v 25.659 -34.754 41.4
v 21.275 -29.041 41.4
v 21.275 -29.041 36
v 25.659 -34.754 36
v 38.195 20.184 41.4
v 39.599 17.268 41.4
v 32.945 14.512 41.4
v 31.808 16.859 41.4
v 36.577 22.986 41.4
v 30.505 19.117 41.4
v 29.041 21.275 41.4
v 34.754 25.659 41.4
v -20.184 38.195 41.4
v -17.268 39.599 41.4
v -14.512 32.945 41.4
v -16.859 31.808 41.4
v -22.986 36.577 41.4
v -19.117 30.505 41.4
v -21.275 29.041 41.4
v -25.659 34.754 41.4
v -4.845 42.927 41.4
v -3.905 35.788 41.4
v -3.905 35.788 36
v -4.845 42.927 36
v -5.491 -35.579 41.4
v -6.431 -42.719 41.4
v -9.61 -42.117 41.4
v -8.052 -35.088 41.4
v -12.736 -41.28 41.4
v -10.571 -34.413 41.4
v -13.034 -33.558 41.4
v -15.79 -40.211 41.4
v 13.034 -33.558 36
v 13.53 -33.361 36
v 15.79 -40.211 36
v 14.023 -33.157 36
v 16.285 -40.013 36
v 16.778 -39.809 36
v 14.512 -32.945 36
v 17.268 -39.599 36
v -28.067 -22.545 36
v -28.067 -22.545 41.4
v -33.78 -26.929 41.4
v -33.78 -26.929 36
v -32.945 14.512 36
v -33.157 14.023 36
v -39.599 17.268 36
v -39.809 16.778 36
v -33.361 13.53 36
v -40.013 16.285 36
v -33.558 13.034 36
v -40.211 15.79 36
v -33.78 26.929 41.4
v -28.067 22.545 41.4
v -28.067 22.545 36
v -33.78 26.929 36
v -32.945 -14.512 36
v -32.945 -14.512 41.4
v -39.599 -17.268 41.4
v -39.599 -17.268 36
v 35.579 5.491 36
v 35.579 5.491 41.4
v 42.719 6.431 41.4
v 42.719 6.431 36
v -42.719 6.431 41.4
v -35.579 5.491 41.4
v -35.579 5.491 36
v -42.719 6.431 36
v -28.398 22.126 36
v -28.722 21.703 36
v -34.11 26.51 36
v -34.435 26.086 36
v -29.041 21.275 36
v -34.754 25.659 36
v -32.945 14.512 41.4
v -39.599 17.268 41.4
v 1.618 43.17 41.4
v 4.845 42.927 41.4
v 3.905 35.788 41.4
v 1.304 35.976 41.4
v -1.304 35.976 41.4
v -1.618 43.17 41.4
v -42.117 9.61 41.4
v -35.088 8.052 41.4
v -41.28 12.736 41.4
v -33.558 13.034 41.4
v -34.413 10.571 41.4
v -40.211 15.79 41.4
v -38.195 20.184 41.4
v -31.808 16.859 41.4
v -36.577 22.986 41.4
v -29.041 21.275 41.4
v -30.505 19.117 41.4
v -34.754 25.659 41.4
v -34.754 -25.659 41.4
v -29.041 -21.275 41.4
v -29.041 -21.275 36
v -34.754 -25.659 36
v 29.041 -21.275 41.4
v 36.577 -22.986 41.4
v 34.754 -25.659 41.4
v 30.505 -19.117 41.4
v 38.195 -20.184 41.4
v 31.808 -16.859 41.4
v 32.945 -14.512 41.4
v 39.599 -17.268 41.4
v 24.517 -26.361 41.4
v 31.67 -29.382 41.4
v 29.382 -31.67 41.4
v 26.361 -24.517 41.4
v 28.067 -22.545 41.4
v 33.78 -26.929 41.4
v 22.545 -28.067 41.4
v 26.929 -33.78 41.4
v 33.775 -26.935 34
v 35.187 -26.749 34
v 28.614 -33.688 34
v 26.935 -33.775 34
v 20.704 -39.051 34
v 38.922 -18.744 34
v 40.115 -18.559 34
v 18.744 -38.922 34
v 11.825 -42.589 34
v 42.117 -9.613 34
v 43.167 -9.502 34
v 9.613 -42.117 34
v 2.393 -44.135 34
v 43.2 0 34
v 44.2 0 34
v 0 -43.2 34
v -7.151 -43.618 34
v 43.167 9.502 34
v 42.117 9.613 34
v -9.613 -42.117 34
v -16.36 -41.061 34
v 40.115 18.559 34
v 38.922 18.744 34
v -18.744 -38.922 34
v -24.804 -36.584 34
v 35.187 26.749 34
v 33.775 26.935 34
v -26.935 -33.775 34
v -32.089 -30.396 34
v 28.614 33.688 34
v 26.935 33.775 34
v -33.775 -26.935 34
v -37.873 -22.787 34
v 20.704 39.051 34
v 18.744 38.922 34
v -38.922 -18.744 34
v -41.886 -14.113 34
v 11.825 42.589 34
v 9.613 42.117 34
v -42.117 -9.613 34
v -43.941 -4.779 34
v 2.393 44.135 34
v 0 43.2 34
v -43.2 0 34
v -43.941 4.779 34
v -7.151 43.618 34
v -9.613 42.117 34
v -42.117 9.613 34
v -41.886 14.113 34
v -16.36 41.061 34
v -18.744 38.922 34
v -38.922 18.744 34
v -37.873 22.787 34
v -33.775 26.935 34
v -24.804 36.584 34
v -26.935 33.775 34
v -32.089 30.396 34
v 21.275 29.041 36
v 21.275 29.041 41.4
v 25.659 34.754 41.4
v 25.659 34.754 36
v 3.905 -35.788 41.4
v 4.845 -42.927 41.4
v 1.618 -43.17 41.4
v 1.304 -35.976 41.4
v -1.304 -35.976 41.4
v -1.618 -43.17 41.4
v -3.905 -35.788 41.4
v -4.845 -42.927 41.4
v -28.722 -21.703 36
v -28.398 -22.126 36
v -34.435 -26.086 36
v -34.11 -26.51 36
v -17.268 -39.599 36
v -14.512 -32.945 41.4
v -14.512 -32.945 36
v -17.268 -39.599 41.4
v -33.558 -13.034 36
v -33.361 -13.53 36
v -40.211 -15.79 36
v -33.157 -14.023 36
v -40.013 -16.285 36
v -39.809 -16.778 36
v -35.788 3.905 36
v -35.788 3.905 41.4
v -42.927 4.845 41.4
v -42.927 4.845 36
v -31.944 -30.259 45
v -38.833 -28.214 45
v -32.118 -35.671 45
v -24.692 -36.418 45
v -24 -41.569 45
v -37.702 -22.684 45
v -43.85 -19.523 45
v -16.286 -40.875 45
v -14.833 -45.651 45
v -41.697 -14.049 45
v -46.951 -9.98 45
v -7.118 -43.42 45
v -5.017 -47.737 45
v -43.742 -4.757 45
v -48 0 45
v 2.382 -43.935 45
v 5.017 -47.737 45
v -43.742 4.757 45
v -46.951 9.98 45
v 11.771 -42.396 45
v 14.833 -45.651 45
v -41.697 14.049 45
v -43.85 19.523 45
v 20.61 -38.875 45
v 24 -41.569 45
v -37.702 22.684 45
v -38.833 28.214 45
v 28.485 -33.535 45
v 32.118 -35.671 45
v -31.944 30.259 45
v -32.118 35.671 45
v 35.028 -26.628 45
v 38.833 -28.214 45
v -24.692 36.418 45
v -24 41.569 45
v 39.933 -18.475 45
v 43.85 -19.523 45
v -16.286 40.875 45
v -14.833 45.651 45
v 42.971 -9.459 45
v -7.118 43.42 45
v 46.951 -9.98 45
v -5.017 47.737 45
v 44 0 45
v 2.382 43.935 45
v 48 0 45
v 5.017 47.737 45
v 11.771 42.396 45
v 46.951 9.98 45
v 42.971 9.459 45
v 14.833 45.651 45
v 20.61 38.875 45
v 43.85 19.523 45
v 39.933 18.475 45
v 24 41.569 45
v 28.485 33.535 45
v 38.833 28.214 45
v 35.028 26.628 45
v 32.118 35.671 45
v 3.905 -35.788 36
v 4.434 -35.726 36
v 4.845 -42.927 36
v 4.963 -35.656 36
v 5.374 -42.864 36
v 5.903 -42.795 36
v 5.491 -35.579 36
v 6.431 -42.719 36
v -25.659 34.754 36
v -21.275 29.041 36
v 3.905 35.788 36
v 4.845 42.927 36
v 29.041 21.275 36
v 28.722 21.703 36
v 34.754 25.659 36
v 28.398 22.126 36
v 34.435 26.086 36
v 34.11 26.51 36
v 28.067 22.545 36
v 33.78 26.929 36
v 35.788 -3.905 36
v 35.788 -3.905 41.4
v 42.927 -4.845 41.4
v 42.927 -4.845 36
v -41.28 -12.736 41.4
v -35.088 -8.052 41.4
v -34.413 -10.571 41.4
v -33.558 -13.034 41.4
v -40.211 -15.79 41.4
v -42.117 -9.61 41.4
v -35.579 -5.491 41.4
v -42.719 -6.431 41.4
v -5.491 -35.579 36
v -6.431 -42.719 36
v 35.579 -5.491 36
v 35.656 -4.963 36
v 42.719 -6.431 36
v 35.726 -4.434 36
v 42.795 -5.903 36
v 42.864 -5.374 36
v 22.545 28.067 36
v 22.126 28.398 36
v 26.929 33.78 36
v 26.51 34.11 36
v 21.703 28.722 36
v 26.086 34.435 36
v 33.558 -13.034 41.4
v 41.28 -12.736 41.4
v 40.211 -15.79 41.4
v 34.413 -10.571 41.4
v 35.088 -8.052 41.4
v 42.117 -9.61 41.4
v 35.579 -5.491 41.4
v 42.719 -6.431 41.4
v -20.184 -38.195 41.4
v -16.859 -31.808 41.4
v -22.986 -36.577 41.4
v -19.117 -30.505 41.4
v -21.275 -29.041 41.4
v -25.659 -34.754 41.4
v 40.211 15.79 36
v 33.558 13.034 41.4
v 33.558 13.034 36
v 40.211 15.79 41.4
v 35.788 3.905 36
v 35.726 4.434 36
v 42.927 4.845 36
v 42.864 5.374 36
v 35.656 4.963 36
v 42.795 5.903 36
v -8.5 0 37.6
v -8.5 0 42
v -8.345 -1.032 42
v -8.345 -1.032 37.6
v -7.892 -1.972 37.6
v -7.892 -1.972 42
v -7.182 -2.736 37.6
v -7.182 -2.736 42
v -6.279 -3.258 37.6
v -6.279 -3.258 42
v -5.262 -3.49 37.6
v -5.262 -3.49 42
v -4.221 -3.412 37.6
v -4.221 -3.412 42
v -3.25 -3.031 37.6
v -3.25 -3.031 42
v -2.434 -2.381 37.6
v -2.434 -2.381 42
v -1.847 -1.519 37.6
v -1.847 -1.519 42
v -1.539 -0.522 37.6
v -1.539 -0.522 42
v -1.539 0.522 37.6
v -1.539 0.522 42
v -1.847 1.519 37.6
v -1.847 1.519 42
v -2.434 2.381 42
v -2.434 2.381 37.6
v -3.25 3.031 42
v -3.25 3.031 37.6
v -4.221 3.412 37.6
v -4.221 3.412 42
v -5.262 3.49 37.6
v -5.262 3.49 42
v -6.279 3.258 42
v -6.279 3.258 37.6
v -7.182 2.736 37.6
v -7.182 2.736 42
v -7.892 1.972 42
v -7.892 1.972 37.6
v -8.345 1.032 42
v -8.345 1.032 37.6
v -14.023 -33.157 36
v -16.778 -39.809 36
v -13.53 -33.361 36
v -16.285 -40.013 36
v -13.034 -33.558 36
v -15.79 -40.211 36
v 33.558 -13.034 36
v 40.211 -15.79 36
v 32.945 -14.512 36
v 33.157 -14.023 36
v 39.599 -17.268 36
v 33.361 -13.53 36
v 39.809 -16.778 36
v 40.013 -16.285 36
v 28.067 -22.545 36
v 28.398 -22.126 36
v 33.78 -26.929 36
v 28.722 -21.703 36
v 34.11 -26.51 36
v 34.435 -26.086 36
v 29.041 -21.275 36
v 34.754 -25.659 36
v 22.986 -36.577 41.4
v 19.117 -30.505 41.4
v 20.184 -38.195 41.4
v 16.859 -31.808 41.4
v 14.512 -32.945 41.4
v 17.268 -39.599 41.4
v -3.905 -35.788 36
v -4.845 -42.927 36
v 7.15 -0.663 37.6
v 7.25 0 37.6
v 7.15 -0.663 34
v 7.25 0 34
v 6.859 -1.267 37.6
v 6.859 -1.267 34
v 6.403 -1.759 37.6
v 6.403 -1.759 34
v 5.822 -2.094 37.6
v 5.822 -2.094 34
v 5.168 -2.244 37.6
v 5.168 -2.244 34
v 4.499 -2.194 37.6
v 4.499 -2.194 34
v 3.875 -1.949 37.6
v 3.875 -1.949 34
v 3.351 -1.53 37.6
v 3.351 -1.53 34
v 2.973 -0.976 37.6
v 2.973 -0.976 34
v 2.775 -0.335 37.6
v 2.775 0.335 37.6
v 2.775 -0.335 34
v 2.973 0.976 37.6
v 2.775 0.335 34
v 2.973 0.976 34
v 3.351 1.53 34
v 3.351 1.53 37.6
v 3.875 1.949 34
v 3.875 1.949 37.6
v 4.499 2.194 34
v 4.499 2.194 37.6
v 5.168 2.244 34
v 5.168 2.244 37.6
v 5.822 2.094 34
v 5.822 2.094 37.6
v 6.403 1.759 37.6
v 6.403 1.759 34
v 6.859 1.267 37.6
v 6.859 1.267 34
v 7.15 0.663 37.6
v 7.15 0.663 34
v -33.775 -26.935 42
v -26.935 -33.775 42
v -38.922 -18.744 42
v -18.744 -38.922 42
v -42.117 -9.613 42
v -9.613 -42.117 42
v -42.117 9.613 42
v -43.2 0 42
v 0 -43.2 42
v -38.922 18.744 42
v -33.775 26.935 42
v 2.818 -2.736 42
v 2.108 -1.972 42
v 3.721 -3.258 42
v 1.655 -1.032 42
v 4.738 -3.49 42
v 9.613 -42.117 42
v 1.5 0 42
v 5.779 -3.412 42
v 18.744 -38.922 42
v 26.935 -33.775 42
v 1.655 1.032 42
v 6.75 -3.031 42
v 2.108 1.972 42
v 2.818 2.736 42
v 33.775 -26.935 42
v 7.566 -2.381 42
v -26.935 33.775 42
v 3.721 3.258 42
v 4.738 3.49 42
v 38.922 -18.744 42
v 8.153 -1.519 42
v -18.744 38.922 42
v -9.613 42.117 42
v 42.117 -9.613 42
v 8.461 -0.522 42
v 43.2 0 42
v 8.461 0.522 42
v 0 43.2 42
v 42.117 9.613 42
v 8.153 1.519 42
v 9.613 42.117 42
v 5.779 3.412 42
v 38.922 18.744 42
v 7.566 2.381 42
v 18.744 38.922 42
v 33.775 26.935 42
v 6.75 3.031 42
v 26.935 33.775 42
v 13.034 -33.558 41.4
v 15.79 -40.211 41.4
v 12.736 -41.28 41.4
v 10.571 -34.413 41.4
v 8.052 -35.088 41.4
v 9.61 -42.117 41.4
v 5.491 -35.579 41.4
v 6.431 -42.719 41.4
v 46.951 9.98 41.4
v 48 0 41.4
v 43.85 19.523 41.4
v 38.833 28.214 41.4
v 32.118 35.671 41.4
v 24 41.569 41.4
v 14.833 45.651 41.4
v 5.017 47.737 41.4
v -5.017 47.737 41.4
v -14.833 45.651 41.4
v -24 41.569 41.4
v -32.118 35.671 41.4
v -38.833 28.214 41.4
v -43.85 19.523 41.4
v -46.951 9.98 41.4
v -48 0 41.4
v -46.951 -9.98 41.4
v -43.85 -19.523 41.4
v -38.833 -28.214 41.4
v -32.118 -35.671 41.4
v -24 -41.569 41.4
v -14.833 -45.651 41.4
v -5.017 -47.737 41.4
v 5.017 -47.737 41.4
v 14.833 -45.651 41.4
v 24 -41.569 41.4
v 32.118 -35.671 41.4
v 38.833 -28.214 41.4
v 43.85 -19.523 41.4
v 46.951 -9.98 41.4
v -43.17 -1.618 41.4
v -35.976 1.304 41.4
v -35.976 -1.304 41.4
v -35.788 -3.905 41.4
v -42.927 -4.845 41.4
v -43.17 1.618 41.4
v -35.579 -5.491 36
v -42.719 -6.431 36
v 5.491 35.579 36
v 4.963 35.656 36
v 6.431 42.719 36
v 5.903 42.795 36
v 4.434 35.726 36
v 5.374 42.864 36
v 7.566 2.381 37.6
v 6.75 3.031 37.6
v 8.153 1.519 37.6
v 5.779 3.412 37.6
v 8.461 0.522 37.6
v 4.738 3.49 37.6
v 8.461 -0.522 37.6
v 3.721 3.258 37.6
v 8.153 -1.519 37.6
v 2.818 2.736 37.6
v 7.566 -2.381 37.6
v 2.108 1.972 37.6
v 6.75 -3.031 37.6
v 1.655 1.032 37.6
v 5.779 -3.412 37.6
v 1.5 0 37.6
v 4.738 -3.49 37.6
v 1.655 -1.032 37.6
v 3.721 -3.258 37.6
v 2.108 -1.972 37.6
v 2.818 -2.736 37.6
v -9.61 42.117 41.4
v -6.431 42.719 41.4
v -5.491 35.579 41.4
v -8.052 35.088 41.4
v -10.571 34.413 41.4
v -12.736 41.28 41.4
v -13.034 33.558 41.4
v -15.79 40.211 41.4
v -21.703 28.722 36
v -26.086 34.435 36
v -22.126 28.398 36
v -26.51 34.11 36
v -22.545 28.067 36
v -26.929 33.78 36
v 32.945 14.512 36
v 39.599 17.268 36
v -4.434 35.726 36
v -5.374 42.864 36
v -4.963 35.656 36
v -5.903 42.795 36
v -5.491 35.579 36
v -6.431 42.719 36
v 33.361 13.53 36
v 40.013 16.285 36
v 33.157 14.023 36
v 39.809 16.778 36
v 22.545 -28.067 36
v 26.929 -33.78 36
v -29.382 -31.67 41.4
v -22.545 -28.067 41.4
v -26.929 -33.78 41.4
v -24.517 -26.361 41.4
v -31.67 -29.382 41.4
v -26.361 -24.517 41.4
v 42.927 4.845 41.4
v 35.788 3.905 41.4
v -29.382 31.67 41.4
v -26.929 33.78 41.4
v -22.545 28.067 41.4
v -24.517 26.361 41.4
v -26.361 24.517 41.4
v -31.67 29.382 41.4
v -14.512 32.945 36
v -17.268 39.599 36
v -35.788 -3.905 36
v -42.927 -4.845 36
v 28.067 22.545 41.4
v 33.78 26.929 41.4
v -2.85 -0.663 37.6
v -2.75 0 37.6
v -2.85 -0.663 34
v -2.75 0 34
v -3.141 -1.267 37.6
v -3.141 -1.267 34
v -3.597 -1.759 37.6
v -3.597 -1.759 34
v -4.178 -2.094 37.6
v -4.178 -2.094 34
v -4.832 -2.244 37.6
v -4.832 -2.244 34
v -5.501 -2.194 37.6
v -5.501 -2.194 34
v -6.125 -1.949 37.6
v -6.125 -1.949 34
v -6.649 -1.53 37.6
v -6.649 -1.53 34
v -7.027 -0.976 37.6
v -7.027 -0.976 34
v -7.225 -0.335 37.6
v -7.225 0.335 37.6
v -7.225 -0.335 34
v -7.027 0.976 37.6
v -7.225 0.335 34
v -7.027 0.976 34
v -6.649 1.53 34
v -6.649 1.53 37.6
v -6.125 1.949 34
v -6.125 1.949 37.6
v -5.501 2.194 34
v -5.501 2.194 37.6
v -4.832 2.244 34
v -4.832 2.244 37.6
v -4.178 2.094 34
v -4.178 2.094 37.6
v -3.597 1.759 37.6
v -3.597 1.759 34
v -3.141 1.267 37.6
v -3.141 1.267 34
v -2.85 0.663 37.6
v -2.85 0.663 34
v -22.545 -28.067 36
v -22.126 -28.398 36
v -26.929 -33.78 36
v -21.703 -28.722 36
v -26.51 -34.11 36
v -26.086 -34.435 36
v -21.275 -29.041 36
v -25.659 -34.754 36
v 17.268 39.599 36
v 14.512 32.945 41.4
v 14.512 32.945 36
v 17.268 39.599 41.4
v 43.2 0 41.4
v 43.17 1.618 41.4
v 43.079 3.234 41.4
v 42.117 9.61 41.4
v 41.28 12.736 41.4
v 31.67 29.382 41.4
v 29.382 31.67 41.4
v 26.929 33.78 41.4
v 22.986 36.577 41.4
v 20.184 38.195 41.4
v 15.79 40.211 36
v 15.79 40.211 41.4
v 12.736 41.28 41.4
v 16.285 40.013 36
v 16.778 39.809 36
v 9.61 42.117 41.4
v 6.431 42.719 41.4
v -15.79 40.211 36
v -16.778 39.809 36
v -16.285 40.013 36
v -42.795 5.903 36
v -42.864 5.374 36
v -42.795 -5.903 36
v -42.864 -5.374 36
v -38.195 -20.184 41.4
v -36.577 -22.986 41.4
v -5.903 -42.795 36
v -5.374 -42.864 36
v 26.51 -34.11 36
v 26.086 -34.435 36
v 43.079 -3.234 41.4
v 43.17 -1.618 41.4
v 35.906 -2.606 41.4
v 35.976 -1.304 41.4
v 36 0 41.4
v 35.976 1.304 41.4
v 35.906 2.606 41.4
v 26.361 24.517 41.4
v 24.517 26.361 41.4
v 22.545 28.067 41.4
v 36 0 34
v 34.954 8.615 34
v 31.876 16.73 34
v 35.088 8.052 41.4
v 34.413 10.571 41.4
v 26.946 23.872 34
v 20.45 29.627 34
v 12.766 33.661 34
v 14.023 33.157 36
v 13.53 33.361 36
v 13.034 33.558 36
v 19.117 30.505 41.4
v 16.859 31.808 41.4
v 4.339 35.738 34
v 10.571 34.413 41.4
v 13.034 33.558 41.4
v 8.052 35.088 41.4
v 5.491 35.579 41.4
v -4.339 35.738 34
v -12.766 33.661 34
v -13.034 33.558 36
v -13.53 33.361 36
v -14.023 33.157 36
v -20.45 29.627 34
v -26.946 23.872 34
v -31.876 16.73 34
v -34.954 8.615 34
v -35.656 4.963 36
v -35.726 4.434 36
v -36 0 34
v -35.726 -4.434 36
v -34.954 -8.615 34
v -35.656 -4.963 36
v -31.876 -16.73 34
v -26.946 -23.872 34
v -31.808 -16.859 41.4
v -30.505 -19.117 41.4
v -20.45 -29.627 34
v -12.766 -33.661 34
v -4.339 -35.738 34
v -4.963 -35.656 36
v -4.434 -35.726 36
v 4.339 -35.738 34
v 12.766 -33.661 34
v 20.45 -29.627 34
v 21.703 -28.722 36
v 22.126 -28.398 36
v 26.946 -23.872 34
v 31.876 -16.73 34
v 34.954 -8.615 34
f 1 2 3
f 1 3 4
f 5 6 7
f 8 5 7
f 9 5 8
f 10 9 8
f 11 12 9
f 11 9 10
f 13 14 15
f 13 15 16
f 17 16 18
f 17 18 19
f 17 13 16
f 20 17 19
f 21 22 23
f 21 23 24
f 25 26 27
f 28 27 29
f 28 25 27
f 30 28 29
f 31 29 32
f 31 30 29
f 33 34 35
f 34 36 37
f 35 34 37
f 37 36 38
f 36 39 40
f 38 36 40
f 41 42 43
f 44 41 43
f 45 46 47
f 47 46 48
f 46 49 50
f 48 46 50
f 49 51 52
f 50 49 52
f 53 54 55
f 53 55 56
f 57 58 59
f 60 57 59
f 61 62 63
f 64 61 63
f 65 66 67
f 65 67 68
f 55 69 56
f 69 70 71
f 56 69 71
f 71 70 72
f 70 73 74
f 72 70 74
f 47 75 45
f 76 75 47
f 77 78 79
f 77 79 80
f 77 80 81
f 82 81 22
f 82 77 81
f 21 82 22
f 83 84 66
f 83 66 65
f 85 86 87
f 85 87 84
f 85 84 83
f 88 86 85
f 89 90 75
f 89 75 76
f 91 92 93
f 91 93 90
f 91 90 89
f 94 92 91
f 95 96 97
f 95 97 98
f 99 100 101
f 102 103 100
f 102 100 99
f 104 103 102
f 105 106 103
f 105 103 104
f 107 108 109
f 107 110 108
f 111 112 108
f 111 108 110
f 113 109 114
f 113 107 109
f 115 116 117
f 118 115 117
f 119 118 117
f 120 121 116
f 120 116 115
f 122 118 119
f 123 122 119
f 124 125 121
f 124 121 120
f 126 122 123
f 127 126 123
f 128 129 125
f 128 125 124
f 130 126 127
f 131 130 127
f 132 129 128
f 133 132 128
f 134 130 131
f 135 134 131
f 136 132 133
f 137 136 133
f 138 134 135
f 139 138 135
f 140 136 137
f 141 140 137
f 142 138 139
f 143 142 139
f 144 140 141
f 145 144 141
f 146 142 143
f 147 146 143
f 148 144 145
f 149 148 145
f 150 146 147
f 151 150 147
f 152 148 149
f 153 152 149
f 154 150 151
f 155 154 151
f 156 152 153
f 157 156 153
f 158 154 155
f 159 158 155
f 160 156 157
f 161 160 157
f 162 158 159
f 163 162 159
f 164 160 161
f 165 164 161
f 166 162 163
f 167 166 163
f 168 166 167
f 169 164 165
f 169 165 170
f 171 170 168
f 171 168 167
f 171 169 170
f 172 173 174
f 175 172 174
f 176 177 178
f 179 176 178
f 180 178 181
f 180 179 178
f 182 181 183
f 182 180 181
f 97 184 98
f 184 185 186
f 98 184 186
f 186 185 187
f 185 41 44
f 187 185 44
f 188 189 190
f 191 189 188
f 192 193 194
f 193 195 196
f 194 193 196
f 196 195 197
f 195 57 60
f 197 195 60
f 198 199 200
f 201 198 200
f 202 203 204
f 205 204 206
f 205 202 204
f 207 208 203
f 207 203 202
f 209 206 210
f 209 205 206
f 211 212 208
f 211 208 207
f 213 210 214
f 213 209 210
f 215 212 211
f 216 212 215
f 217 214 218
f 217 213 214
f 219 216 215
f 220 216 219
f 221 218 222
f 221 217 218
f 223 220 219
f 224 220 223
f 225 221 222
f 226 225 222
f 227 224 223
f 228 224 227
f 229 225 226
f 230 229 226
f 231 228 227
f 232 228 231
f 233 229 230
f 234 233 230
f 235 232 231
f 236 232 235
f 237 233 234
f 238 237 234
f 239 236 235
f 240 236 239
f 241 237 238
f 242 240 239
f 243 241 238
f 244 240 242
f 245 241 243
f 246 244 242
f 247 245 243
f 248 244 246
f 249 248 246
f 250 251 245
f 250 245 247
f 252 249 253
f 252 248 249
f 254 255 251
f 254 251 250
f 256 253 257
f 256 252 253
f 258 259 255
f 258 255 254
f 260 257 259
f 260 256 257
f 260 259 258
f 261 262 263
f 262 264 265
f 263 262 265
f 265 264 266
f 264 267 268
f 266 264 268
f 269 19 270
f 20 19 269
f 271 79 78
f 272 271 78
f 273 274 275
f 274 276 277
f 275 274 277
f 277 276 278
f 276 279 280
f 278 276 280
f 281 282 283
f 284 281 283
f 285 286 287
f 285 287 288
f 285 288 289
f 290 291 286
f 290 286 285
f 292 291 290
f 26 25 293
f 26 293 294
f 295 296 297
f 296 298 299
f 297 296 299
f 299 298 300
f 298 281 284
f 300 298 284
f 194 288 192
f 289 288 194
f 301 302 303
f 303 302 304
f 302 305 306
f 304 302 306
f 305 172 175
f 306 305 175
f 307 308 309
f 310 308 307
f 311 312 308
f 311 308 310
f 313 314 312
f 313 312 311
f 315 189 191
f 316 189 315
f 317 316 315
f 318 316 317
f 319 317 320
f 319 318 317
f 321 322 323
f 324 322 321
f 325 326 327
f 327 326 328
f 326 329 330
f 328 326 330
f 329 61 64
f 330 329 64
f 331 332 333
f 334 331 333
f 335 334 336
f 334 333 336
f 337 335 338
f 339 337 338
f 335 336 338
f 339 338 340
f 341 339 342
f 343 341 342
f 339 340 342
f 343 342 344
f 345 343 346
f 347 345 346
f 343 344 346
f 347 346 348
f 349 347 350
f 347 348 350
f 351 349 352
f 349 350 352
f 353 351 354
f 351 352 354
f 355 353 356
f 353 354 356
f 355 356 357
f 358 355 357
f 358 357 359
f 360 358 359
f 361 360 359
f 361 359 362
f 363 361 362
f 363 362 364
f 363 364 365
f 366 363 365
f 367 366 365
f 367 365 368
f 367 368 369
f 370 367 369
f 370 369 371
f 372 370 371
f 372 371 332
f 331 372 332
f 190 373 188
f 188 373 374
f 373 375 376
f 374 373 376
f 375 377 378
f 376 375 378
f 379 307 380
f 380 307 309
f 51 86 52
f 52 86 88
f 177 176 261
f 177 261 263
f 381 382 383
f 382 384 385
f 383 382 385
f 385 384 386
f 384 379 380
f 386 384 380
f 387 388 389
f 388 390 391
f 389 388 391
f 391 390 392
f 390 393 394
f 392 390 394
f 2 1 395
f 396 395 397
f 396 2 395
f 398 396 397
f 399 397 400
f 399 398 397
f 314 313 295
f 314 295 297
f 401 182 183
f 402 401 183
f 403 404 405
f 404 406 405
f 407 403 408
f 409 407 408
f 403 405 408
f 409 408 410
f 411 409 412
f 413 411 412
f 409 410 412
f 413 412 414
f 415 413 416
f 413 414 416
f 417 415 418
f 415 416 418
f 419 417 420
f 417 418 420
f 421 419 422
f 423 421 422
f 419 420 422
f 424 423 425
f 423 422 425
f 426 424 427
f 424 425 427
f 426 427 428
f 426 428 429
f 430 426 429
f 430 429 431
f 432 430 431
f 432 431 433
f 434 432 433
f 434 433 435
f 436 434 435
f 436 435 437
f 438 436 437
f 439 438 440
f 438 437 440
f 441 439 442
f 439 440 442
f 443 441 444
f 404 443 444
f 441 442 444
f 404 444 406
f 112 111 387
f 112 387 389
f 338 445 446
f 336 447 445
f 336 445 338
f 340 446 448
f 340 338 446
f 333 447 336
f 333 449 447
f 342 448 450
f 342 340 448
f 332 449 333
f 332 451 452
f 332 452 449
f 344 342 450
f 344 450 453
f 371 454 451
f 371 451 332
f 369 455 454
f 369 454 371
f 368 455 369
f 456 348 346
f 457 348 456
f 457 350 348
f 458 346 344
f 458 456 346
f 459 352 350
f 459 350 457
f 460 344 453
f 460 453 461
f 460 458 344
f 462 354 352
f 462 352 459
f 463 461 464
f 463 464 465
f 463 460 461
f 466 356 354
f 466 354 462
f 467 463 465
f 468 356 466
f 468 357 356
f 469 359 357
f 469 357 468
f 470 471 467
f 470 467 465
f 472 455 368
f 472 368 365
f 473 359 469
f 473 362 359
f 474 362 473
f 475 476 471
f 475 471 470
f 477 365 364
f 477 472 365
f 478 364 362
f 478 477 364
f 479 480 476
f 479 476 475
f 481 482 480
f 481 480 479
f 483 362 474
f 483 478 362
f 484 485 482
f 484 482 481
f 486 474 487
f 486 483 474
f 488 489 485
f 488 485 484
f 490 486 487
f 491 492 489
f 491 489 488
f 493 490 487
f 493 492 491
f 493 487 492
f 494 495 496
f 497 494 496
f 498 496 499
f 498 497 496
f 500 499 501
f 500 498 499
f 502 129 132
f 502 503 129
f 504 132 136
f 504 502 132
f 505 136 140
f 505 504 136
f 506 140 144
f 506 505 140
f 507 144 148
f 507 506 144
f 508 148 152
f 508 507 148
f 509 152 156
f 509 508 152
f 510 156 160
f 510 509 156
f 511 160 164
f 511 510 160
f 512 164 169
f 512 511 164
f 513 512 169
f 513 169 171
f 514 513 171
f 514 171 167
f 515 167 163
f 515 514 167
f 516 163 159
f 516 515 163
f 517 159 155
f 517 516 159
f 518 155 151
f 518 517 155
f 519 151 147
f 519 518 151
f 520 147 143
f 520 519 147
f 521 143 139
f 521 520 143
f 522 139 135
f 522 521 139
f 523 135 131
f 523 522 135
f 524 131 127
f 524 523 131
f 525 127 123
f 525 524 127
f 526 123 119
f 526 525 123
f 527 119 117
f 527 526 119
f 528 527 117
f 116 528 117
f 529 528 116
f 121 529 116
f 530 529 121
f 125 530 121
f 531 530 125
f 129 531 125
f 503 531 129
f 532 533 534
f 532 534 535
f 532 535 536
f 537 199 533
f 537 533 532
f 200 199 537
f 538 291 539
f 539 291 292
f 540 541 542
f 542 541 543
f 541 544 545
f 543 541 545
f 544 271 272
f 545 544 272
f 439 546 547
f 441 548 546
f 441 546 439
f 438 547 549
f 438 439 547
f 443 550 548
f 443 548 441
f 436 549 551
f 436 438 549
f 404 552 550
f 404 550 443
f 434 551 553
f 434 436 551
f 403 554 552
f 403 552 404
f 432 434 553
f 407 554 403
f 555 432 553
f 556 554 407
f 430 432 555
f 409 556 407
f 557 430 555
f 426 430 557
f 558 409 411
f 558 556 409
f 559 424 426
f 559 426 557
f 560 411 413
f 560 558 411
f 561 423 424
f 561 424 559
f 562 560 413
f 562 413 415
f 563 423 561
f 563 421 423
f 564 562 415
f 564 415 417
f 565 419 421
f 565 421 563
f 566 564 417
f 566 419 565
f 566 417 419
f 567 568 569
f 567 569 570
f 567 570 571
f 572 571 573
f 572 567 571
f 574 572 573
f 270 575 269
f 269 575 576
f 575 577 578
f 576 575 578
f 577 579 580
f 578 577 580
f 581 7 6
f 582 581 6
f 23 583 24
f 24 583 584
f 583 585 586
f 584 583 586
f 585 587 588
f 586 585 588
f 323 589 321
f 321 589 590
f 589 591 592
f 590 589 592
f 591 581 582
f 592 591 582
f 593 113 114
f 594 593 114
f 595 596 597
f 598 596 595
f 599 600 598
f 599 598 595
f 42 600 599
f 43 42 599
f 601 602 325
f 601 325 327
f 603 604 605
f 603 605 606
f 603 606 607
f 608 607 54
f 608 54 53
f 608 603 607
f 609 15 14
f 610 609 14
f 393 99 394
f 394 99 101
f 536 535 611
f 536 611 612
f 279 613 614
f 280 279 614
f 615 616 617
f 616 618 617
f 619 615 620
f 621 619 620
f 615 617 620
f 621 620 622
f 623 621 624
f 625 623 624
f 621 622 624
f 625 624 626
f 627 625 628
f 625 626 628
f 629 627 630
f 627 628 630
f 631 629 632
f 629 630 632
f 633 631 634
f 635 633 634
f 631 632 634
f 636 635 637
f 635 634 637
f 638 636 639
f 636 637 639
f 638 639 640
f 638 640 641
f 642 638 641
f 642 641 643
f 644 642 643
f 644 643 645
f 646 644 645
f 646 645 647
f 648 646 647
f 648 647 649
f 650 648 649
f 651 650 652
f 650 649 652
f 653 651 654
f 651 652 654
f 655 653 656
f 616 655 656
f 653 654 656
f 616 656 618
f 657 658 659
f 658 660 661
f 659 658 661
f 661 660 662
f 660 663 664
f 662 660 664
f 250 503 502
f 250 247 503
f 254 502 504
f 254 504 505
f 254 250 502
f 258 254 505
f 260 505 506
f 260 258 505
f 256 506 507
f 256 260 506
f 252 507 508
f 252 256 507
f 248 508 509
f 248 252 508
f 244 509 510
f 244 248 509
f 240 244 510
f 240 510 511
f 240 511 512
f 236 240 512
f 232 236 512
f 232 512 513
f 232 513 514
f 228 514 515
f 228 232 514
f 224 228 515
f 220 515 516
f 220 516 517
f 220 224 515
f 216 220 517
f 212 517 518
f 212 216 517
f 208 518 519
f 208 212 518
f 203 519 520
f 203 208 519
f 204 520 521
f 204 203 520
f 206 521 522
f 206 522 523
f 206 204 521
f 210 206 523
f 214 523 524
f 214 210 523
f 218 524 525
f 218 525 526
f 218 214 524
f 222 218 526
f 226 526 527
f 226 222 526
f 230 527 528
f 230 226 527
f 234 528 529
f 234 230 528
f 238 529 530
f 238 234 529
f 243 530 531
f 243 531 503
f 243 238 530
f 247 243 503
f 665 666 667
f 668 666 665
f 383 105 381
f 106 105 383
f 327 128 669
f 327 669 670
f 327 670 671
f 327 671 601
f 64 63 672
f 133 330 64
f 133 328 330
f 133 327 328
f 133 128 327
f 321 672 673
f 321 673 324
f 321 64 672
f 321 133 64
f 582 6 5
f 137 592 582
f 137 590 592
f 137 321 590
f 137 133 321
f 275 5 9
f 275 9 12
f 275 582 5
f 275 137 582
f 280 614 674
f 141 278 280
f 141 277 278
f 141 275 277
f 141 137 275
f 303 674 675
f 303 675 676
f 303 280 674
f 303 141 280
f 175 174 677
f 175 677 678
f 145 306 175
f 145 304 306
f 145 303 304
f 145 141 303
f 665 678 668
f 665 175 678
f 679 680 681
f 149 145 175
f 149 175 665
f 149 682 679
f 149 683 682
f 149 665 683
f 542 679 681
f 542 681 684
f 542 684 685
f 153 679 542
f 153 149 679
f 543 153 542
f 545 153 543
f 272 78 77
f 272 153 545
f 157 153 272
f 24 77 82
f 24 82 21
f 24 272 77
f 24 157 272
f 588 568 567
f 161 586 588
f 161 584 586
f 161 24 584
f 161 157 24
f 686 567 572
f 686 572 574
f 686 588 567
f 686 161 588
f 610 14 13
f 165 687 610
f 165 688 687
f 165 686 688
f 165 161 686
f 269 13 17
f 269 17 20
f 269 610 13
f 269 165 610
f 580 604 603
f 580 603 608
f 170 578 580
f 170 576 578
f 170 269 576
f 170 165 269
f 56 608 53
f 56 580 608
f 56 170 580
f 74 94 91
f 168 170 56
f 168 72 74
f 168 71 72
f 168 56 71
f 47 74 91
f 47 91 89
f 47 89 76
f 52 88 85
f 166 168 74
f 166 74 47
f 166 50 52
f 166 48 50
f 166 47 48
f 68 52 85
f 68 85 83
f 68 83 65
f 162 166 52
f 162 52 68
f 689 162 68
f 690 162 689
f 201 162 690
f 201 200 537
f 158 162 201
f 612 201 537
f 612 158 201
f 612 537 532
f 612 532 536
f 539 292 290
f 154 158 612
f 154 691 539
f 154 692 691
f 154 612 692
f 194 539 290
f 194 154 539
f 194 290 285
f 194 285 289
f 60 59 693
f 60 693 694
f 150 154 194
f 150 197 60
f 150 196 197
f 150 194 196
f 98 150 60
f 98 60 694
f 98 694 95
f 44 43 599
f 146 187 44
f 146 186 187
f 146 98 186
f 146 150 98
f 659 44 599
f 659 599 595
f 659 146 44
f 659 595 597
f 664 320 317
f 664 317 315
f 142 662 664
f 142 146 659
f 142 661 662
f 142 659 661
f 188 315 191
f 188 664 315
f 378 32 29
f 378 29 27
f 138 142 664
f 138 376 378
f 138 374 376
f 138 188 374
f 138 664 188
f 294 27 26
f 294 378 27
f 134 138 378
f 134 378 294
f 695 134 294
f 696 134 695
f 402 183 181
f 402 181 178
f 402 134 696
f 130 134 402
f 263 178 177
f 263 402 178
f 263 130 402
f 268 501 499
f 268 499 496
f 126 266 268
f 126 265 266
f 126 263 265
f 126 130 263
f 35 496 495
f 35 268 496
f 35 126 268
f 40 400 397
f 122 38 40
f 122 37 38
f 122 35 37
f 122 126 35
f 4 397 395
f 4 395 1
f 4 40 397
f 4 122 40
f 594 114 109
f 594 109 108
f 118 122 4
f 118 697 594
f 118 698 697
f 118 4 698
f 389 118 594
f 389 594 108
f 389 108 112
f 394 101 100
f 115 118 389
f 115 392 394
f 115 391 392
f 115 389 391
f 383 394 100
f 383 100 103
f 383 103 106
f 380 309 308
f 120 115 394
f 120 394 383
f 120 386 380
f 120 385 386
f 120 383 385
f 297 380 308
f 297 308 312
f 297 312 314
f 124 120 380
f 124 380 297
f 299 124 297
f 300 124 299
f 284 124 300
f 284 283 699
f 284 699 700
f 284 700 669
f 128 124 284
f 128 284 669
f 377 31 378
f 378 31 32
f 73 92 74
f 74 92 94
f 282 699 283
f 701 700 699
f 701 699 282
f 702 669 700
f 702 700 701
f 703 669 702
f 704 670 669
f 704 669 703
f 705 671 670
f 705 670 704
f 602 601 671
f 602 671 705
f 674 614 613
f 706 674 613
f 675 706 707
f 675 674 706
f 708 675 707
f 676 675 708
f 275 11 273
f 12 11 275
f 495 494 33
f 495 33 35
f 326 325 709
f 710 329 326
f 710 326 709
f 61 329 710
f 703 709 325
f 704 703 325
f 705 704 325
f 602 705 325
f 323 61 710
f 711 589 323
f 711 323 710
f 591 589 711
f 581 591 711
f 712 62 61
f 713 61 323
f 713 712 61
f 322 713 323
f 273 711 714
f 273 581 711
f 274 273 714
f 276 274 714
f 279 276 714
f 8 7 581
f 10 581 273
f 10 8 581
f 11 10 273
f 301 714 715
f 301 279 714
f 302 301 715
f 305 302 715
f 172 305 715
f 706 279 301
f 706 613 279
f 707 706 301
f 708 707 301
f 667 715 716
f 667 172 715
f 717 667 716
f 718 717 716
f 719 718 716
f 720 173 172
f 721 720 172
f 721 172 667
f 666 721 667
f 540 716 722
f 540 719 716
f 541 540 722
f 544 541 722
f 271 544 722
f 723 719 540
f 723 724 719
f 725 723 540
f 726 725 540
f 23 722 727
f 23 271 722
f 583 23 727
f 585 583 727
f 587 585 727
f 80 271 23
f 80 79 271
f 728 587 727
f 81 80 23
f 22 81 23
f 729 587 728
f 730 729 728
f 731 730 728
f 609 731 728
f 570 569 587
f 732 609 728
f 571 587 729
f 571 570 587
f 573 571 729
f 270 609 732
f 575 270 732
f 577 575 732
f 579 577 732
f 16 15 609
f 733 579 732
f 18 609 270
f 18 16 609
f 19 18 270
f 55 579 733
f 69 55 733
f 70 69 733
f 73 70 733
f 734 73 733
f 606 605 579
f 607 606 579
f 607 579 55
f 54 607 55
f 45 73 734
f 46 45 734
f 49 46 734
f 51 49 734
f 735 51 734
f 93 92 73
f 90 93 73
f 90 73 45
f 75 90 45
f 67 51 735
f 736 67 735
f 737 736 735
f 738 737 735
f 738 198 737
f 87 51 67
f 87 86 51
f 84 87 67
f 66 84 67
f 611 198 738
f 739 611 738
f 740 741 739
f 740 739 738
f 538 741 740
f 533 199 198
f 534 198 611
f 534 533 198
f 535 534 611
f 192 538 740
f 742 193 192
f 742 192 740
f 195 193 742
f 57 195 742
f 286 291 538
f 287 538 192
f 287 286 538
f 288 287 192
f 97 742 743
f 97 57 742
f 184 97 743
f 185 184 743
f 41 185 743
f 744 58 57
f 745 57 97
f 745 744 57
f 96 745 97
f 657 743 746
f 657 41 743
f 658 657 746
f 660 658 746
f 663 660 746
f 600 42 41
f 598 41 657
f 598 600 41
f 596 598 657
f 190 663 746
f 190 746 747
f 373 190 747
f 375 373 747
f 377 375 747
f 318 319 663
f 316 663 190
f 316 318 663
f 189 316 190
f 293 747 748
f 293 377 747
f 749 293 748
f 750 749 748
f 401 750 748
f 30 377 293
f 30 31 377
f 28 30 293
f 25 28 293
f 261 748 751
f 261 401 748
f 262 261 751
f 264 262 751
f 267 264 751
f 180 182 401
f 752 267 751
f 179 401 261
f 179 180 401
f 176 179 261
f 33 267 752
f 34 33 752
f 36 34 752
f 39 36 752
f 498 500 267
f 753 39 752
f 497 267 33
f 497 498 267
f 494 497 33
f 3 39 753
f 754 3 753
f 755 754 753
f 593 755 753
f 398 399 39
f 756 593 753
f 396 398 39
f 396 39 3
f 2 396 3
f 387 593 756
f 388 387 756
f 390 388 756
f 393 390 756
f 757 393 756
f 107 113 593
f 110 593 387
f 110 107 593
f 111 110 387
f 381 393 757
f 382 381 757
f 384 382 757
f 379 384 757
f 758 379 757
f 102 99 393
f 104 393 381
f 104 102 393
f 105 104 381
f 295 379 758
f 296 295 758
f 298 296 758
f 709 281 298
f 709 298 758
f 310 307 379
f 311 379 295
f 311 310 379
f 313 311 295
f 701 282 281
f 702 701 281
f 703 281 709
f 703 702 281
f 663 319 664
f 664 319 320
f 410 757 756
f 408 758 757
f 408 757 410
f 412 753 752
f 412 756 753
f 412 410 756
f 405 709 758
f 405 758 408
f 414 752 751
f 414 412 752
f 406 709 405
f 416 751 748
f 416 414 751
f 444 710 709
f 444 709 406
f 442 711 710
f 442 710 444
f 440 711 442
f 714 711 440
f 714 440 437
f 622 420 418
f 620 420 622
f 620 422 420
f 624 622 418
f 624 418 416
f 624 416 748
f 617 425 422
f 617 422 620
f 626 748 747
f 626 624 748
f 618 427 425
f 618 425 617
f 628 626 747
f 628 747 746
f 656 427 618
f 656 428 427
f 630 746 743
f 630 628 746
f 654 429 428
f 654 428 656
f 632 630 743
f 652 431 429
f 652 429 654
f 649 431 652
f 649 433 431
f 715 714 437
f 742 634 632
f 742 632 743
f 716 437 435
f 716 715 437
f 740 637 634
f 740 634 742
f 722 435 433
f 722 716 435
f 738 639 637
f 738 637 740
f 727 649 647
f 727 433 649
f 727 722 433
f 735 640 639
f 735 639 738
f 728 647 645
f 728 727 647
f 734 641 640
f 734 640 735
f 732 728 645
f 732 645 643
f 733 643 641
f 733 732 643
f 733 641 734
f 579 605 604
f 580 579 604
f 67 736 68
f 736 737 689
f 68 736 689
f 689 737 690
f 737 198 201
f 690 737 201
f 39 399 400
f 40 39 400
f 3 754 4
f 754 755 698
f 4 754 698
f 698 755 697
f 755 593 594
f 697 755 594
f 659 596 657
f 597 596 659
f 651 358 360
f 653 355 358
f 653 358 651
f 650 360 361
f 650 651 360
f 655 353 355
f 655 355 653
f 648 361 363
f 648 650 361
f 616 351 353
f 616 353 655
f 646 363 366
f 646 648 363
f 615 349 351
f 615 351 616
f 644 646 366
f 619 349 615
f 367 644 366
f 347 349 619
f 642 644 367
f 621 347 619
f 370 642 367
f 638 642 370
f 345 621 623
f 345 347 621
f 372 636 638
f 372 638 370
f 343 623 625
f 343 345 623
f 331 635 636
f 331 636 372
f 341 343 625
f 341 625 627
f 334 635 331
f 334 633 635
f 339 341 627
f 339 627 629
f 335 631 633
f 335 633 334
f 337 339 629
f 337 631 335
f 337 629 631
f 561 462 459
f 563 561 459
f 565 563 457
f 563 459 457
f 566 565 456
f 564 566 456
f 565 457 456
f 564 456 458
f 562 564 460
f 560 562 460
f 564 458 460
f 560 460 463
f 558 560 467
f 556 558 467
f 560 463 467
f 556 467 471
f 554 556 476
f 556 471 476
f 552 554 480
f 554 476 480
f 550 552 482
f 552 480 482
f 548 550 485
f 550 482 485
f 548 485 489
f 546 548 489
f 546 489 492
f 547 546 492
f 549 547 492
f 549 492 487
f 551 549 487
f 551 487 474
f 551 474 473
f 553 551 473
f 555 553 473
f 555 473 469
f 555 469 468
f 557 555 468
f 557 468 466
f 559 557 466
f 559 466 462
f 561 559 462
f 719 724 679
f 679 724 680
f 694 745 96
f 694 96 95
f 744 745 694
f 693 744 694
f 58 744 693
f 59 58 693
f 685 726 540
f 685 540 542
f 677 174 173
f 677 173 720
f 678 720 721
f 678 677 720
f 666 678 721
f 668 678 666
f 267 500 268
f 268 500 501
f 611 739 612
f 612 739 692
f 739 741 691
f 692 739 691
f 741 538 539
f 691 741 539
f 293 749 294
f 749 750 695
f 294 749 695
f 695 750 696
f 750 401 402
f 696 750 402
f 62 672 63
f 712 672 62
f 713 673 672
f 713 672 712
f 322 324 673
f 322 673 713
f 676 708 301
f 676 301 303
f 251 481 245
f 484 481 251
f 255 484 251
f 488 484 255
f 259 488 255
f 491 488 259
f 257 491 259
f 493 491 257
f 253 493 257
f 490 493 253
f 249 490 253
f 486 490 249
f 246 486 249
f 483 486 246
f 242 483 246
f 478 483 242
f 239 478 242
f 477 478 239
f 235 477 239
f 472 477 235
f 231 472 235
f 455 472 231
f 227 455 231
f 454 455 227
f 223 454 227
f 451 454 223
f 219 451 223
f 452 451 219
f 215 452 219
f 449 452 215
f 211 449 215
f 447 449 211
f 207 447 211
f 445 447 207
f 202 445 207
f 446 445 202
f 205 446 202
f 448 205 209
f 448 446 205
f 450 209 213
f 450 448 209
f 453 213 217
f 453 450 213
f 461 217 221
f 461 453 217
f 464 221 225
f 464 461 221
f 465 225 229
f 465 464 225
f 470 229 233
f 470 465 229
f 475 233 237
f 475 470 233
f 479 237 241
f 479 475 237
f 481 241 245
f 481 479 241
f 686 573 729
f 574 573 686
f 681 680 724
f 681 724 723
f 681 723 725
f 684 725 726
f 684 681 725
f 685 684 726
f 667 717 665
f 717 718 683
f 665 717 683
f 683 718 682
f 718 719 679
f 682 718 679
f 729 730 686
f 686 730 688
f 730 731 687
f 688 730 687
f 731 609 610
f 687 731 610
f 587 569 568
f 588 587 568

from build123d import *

# Parameters (mm, degrees)
SKETCH091_W           = 44.5
SKETCH091_H           = 1.6
PAD034_DEPTH          = 6
POLARPATTERN017_COUNT = 24
HOLE001_D             = 4.5
HOLE001_DEPTH         = 25
HOLE001_CBORE_D       = 7
HOLE001_CBORE_DEPTH   = 4.4


with BuildPart() as part:
    # Sketch089 → Revolution011 (revolve)
    with BuildSketch(Plane.XZ):
        Polygon((0, 34), (36, 34), (36, 41.4), (43.2, 41.4), (43.2, 34), (44.2, 34), (48, 41.4), (48, 45), (44, 45), (43.2, 42), (0, 42), align=None)
    revolve(axis=Axis((0, 0, 0), (0, 0, 1)))

    # Sketch091 → Pad034 (new body)
    with BuildSketch(Plane(origin=(0, 0, 42), x_dir=(0.991445, 0.130526, 0), z_dir=(0, 0, 1))):
        with Locations((22.25, 0)):
            Rectangle(SKETCH091_W, SKETCH091_H)
    pad034 = extrude(amount=-PAD034_DEPTH)

    # PolarPattern017: Pad034 ×24 about axis
    polarpattern017_axis = Axis((0, 0, 42), (0, 0, 1))
    for i in range(1, POLARPATTERN017_COUNT):
        add(pad034.rotate(polarpattern017_axis, i * 360 / POLARPATTERN017_COUNT))

    # Hole001
    with Locations(Plane(origin=(0, 0, 42), x_dir=(-1, 0, 0), z_dir=(0, 0, 1))):
        with Locations((5, 0), (-5, 0)):
            CounterBoreHole(HOLE001_D / 2, HOLE001_CBORE_D / 2, HOLE001_CBORE_DEPTH, depth=HOLE001_DEPTH)


solid = part.part
